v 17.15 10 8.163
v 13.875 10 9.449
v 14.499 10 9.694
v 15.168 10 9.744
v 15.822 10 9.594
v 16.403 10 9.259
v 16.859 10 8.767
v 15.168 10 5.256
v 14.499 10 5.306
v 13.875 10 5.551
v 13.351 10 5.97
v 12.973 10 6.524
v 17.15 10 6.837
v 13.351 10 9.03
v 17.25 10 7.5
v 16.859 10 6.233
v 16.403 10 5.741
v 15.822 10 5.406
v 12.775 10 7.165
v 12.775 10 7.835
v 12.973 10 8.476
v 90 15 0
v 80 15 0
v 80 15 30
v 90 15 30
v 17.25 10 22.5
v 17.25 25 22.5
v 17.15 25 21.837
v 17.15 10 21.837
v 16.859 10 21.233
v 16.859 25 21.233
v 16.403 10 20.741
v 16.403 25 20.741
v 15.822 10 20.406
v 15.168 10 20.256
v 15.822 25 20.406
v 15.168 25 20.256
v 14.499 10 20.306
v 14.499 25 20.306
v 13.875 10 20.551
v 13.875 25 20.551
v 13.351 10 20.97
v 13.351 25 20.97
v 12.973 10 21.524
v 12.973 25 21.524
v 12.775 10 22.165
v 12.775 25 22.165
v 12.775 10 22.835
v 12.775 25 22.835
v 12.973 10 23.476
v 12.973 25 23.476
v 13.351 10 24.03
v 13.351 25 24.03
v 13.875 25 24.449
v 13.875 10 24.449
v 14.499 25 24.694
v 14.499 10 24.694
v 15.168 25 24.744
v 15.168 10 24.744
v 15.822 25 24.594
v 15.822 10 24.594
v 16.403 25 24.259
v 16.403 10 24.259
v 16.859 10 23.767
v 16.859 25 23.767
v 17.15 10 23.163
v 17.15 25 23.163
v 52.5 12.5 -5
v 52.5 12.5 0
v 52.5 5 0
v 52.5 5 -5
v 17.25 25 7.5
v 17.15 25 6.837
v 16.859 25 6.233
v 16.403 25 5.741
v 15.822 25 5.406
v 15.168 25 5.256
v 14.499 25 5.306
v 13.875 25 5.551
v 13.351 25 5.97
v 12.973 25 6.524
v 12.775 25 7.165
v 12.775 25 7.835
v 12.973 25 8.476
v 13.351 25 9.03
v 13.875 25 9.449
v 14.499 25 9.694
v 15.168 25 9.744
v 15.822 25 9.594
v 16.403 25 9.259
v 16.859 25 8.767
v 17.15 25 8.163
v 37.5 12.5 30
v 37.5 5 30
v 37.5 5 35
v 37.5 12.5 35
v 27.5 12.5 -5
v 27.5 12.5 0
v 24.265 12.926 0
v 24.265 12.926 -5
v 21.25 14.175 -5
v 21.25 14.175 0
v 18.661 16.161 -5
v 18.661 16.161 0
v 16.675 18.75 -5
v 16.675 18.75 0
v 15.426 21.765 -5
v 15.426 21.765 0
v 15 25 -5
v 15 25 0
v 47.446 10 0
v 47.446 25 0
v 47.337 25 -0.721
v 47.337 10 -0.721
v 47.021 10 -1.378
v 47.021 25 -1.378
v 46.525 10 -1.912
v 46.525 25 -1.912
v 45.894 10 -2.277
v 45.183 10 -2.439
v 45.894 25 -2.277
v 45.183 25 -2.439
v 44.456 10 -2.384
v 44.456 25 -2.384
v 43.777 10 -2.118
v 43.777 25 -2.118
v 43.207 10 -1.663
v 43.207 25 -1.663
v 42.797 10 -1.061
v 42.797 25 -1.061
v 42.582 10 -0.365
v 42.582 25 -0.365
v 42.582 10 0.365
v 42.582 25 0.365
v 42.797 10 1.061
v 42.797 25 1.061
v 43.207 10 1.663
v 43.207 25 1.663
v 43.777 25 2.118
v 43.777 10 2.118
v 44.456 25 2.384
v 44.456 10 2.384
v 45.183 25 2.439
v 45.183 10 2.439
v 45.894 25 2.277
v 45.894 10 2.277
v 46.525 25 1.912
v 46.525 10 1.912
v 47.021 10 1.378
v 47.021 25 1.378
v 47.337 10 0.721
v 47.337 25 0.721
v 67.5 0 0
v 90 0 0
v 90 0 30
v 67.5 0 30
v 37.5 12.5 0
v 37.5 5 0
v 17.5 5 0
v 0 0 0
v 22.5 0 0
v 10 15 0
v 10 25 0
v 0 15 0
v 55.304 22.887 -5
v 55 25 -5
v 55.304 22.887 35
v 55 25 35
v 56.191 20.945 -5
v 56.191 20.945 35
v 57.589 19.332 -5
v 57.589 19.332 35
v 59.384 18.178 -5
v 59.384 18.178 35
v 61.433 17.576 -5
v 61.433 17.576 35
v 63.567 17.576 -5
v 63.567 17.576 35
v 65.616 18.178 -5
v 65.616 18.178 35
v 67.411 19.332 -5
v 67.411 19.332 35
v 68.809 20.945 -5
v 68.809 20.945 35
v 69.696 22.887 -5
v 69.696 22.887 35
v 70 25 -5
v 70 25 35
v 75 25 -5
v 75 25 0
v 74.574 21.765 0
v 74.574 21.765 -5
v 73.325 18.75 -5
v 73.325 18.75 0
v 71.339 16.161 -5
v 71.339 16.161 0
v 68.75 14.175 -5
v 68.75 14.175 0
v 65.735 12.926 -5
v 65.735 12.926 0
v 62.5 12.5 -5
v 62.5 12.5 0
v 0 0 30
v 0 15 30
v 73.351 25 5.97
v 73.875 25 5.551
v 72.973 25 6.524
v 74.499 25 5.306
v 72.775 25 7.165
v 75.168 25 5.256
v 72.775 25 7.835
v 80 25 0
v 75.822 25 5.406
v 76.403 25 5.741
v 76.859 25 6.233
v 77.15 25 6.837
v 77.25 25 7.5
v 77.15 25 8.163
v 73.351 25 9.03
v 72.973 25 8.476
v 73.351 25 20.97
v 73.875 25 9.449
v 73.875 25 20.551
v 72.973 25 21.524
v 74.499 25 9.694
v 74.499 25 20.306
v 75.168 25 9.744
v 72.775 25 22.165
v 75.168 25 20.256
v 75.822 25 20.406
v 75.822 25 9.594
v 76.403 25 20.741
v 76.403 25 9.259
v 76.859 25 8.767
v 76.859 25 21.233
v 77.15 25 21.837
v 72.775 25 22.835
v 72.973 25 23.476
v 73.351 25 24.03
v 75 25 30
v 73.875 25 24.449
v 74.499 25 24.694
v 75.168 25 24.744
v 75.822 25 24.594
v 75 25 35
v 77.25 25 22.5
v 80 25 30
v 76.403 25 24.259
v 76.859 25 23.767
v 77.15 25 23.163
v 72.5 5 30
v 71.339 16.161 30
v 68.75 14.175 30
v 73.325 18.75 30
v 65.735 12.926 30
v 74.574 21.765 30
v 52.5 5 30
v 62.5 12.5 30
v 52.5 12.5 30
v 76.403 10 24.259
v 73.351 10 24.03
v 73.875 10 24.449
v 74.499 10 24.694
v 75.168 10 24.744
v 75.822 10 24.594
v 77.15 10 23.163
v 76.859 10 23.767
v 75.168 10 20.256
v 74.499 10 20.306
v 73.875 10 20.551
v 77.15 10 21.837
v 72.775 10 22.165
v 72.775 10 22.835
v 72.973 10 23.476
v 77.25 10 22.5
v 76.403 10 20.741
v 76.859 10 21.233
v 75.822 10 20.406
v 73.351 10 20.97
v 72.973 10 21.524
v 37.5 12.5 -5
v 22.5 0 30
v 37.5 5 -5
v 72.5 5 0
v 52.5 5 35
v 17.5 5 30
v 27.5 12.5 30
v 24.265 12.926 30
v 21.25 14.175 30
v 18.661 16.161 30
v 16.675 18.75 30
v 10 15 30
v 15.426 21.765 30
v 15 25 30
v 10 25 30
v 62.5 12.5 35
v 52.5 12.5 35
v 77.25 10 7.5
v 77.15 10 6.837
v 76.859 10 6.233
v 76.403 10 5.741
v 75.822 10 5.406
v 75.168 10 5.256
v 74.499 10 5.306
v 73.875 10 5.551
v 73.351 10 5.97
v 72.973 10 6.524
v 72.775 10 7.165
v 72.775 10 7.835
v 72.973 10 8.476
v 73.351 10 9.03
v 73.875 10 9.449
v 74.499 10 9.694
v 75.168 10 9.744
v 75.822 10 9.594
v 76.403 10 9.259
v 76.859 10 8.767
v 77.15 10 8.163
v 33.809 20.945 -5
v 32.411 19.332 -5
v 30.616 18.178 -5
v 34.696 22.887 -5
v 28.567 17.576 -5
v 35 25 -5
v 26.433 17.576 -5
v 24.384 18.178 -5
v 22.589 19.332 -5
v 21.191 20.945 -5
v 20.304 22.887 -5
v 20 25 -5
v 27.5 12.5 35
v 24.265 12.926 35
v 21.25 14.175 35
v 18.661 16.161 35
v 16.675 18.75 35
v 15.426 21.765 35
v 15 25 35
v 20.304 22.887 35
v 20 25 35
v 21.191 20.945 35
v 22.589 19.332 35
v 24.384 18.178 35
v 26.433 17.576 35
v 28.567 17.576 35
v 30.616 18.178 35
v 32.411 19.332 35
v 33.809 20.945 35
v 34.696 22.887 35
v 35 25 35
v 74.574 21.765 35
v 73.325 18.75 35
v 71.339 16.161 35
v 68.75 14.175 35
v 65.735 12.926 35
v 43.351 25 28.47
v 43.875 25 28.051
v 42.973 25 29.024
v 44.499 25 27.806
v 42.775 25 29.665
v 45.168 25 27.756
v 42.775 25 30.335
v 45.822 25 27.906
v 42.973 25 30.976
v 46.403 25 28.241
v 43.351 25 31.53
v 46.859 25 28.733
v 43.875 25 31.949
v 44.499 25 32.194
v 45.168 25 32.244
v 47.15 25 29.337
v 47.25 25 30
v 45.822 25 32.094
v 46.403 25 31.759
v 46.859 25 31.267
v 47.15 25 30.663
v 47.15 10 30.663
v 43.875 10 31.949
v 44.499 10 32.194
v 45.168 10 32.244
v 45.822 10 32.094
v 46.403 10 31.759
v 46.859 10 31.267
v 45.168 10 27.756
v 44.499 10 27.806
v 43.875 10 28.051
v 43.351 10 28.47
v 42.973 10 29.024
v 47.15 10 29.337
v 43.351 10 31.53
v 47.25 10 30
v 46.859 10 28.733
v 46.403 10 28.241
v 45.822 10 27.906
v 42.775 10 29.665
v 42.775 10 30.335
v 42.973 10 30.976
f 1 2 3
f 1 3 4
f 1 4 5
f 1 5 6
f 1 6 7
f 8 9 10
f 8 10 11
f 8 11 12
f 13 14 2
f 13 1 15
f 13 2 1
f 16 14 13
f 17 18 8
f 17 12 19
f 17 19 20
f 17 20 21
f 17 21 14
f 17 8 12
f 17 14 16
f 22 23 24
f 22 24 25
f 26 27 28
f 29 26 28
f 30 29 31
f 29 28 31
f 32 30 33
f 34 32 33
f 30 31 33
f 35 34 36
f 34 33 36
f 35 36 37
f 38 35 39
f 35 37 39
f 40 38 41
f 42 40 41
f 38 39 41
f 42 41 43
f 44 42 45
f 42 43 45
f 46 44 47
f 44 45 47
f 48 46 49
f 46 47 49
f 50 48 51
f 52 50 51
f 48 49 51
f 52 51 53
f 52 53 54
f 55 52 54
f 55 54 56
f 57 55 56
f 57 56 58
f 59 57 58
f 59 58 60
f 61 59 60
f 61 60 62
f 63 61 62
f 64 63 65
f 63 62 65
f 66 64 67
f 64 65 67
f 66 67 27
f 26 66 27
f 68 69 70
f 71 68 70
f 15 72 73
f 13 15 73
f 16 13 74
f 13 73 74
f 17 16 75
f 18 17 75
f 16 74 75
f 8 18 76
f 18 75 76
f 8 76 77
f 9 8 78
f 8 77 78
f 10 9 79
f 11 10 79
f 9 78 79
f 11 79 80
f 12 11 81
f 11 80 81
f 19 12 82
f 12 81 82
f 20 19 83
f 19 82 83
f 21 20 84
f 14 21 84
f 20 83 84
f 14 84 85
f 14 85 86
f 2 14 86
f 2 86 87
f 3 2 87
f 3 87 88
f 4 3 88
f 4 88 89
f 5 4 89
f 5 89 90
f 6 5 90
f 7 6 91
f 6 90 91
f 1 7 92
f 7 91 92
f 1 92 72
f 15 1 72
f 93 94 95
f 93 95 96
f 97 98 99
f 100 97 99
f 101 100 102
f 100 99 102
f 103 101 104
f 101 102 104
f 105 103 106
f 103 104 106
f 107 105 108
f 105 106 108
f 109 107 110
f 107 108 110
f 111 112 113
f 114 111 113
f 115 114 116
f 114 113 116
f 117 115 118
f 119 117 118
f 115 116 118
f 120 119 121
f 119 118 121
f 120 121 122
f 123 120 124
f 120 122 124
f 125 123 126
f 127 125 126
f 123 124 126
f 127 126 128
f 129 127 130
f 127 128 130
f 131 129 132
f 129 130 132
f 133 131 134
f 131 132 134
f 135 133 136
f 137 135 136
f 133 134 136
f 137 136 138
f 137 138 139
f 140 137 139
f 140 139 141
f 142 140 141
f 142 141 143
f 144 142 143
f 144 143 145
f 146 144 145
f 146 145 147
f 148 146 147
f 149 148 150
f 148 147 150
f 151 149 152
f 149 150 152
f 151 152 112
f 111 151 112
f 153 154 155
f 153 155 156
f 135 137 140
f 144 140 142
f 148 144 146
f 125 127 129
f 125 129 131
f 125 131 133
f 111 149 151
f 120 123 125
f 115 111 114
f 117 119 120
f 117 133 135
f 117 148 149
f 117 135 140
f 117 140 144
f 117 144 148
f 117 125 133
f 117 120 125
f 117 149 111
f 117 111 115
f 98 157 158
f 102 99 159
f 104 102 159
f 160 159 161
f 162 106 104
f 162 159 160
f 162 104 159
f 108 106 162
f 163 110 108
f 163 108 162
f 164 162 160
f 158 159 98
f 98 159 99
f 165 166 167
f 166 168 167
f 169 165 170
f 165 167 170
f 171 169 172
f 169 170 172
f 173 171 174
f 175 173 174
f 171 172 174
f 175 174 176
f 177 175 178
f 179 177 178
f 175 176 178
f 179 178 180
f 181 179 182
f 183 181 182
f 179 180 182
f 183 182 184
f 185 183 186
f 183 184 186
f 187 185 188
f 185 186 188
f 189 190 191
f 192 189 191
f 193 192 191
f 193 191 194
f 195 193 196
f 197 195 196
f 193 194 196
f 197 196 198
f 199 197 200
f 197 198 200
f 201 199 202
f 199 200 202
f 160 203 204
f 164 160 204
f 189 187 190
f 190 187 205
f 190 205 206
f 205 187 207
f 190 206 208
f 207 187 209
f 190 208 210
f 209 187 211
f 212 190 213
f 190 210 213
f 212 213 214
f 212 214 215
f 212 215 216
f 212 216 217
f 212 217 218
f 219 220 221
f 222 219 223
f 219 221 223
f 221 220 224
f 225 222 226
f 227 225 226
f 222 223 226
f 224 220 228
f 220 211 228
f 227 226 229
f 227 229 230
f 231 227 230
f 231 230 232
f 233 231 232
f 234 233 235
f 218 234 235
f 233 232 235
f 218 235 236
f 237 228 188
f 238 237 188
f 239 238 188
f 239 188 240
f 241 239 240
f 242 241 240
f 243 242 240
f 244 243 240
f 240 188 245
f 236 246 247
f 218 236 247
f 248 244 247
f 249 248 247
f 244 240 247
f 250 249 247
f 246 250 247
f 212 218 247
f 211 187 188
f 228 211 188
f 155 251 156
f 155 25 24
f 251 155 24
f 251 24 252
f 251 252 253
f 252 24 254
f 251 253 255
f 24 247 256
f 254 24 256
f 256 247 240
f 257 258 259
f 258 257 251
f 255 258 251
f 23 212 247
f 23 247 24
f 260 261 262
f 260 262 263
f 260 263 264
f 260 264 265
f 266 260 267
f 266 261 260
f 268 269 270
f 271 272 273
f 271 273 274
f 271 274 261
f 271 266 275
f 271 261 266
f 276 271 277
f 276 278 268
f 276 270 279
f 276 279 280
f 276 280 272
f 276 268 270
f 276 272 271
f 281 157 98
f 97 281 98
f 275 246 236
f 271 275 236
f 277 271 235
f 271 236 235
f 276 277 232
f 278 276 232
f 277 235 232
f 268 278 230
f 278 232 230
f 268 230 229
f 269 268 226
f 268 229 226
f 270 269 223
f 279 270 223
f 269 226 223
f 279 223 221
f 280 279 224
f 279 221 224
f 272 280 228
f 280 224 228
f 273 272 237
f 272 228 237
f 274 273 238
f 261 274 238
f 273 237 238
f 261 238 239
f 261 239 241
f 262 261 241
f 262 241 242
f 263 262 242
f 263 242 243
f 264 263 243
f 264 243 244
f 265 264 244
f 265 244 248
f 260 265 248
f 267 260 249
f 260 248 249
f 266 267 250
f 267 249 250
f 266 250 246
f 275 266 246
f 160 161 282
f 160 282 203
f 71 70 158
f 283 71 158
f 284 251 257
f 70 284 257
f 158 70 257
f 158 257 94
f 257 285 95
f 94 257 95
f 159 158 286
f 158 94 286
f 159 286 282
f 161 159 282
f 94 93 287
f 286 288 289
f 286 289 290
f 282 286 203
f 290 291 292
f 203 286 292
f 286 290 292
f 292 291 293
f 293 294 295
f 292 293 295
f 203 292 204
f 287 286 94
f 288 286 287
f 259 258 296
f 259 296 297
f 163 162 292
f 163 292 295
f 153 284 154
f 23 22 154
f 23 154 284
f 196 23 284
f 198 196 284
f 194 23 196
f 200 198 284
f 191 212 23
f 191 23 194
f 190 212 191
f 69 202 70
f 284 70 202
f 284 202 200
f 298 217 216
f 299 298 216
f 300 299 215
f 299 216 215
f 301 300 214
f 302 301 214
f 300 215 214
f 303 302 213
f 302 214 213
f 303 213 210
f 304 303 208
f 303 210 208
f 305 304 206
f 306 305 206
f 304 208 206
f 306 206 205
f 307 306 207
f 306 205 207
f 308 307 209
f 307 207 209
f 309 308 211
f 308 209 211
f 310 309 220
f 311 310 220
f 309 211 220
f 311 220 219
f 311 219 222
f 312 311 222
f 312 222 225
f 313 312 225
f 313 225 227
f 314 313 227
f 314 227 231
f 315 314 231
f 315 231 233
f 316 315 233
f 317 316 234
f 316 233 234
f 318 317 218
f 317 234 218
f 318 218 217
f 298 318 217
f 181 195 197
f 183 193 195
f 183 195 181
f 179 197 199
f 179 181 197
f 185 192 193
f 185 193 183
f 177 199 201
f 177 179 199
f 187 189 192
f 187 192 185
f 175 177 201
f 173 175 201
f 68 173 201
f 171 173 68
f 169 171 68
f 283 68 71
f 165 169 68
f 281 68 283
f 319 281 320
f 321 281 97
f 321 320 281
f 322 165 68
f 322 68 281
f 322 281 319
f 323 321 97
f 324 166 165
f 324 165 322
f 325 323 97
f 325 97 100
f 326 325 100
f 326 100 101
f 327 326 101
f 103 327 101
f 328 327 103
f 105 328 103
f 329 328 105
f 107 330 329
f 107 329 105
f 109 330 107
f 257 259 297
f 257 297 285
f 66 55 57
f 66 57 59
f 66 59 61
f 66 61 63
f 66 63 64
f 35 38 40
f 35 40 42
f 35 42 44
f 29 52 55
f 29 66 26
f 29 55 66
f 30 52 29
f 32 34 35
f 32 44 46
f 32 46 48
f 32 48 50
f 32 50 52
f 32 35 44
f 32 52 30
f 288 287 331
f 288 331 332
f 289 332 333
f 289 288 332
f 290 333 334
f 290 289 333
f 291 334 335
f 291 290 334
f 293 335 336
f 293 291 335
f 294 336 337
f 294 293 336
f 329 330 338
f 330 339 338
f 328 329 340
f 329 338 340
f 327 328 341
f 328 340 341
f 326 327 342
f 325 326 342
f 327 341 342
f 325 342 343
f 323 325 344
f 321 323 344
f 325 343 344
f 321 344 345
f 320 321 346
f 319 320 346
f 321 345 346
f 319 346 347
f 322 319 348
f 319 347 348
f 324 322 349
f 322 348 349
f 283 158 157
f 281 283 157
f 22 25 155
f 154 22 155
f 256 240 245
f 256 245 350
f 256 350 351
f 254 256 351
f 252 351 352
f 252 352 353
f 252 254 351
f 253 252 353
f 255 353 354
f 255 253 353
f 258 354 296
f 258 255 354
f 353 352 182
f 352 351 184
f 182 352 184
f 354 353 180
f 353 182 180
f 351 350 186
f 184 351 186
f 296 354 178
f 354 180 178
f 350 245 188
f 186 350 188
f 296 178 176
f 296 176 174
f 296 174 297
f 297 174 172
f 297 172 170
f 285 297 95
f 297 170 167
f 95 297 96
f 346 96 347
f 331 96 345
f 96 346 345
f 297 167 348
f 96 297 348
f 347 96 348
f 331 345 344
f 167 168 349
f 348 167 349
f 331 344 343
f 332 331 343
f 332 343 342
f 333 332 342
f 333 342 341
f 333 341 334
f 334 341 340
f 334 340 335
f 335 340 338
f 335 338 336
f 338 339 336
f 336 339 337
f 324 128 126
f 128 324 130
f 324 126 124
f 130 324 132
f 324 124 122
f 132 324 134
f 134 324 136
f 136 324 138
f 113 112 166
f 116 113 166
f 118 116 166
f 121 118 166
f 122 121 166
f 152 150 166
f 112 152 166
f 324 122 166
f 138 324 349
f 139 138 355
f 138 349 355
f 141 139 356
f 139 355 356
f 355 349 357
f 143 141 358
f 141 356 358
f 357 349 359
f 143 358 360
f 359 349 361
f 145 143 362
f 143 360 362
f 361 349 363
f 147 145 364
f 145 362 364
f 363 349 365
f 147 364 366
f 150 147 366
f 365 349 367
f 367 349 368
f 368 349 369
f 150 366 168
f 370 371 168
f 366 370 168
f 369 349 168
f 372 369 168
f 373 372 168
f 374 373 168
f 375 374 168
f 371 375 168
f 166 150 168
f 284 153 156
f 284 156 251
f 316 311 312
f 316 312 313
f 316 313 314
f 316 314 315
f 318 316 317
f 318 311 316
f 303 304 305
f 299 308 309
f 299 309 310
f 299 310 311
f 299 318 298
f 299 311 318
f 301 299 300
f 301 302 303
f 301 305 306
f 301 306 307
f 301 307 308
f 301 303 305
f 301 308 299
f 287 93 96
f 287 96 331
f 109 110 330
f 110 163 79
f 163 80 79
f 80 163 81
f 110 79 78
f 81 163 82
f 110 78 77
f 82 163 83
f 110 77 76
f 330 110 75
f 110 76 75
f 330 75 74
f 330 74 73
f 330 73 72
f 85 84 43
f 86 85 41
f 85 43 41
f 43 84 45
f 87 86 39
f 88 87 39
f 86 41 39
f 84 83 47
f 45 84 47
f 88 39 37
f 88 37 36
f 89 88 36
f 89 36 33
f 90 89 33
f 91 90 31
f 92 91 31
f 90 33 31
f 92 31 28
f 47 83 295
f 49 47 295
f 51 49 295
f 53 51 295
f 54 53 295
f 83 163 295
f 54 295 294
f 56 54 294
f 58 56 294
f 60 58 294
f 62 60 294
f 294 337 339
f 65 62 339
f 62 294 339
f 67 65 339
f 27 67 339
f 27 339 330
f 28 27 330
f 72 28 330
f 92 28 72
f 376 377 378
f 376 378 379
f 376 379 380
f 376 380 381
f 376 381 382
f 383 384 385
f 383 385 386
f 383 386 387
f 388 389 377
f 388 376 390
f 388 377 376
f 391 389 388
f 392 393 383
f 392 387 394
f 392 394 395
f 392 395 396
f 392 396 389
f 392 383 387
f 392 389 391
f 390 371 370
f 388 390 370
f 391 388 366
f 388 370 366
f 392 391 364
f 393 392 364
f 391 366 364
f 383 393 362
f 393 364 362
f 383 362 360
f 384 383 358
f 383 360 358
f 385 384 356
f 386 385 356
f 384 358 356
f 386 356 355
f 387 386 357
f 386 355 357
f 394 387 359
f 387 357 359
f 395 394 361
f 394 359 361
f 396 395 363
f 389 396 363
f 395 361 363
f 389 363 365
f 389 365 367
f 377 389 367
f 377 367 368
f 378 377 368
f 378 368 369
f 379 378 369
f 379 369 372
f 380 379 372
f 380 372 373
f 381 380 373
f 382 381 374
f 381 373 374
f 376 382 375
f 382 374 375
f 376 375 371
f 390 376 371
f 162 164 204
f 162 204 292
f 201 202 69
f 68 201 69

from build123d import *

# Parameters (mm, degrees)
BOSS_EXTRUDE2_DEPTH = 30
BOSS_EXTRUDE3_DEPTH = 5
BOSS_EXTRUDE4_DEPTH = 5
SKETCH5_R           = 2.25
SKETCH5_R_2         = 2.445661488
CUT_EXTRUDE2_DEPTH  = 15


with BuildPart() as part:
    # Sketch1 → Boss-Extrude2 (new body)
    with BuildSketch(Plane.XY):
        with BuildLine():
            Line((0, 0), (0, 15))
            Line((0, 15), (10, 15))
            Line((10, 15), (10, 25))
            Line((10, 25), (20, 25))
            ThreePointArc((20, 25), (27.5, 17.5), (35, 25))
            Line((35, 25), (55, 25))
            ThreePointArc((55, 25), (62.5, 17.5), (70, 25))
            Line((70, 25), (80, 25))
            Line((80, 25), (80, 15))
            Line((80, 15), (90, 15))
            Line((90, 15), (90, 0))
            Line((90, 0), (67.5, 0))
            Line((67.5, 0), (72.5, 5))
            Line((72.5, 5), (17.5, 5))
            Line((17.5, 5), (22.5, 0))
            Line((22.5, 0), (0, 0))
        make_face()
    extrude(amount=BOSS_EXTRUDE2_DEPTH)

    # Sketch3 → Boss-Extrude3 (add)
    with BuildSketch(Plane.XY.offset(30)):
        with BuildLine():
            Line((70, 25), (75, 25))
            ThreePointArc((75, 25), (71.338834765, 16.161165235), (62.5, 12.5))
            Line((62.5, 12.5), (52.5, 12.5))
            Line((52.5, 12.5), (52.5, 5))
            Line((52.5, 5), (37.5, 5))
            Line((37.5, 5), (37.5, 12.5))
            Line((37.5, 12.5), (27.5, 12.5))
            ThreePointArc((27.5, 12.5), (18.661165235, 16.161165235), (15, 25))
            Line((15, 25), (20, 25))
            ThreePointArc((20, 25), (27.5, 17.5), (35, 25))
            Line((35, 25), (55, 25))
            ThreePointArc((55, 25), (62.5, 17.5), (70, 25))
        make_face()
    extrude(amount=BOSS_EXTRUDE3_DEPTH)

    # Sketch4 → Boss-Extrude4 (add)
    with BuildSketch(Plane(origin=(0, 0, 0), x_dir=(-1, 0, 0), z_dir=(0, 0, -1))):
        with BuildLine():
            Line((-62.5, 12.5), (-52.5, 12.5))
            Line((-52.5, 12.5), (-52.5, 5))
            Line((-52.5, 5), (-37.5, 5))
            Line((-37.5, 5), (-37.5, 12.5))
            Line((-37.5, 12.5), (-27.5, 12.5))
            ThreePointArc((-27.5, 12.5), (-18.661165235, 16.161165235), (-15, 25))
            Line((-15, 25), (-20, 25))
            ThreePointArc((-20, 25), (-27.5, 17.5), (-35, 25))
            Line((-35, 25), (-55, 25))
            ThreePointArc((-55, 25), (-62.5, 17.5), (-70, 25))
            Line((-70, 25), (-75, 25))
            ThreePointArc((-75, 25), (-71.338834765, 16.161165235), (-62.5, 12.5))
        make_face()
    extrude(amount=BOSS_EXTRUDE4_DEPTH)

    # Sketch5 → Cut-Extrude2 (cut)
    with BuildSketch(Plane(origin=(0, 25, 0), x_dir=(1, 0, 0), z_dir=(0, 1, 0))):
        with Locations((75, -7.5)):
            Circle(SKETCH5_R)
        with Locations((75, -22.5)):
            Circle(SKETCH5_R)
        with Locations((15, -22.5)):
            Circle(SKETCH5_R)
        with Locations((15, -7.5)):
            Circle(SKETCH5_R)
        with Locations((45, 0)):
            Circle(SKETCH5_R_2)
        with Locations((45, -30)):
            Circle(SKETCH5_R)
    extrude(amount=-CUT_EXTRUDE2_DEPTH, mode=Mode.SUBTRACT)


solid = part.part
